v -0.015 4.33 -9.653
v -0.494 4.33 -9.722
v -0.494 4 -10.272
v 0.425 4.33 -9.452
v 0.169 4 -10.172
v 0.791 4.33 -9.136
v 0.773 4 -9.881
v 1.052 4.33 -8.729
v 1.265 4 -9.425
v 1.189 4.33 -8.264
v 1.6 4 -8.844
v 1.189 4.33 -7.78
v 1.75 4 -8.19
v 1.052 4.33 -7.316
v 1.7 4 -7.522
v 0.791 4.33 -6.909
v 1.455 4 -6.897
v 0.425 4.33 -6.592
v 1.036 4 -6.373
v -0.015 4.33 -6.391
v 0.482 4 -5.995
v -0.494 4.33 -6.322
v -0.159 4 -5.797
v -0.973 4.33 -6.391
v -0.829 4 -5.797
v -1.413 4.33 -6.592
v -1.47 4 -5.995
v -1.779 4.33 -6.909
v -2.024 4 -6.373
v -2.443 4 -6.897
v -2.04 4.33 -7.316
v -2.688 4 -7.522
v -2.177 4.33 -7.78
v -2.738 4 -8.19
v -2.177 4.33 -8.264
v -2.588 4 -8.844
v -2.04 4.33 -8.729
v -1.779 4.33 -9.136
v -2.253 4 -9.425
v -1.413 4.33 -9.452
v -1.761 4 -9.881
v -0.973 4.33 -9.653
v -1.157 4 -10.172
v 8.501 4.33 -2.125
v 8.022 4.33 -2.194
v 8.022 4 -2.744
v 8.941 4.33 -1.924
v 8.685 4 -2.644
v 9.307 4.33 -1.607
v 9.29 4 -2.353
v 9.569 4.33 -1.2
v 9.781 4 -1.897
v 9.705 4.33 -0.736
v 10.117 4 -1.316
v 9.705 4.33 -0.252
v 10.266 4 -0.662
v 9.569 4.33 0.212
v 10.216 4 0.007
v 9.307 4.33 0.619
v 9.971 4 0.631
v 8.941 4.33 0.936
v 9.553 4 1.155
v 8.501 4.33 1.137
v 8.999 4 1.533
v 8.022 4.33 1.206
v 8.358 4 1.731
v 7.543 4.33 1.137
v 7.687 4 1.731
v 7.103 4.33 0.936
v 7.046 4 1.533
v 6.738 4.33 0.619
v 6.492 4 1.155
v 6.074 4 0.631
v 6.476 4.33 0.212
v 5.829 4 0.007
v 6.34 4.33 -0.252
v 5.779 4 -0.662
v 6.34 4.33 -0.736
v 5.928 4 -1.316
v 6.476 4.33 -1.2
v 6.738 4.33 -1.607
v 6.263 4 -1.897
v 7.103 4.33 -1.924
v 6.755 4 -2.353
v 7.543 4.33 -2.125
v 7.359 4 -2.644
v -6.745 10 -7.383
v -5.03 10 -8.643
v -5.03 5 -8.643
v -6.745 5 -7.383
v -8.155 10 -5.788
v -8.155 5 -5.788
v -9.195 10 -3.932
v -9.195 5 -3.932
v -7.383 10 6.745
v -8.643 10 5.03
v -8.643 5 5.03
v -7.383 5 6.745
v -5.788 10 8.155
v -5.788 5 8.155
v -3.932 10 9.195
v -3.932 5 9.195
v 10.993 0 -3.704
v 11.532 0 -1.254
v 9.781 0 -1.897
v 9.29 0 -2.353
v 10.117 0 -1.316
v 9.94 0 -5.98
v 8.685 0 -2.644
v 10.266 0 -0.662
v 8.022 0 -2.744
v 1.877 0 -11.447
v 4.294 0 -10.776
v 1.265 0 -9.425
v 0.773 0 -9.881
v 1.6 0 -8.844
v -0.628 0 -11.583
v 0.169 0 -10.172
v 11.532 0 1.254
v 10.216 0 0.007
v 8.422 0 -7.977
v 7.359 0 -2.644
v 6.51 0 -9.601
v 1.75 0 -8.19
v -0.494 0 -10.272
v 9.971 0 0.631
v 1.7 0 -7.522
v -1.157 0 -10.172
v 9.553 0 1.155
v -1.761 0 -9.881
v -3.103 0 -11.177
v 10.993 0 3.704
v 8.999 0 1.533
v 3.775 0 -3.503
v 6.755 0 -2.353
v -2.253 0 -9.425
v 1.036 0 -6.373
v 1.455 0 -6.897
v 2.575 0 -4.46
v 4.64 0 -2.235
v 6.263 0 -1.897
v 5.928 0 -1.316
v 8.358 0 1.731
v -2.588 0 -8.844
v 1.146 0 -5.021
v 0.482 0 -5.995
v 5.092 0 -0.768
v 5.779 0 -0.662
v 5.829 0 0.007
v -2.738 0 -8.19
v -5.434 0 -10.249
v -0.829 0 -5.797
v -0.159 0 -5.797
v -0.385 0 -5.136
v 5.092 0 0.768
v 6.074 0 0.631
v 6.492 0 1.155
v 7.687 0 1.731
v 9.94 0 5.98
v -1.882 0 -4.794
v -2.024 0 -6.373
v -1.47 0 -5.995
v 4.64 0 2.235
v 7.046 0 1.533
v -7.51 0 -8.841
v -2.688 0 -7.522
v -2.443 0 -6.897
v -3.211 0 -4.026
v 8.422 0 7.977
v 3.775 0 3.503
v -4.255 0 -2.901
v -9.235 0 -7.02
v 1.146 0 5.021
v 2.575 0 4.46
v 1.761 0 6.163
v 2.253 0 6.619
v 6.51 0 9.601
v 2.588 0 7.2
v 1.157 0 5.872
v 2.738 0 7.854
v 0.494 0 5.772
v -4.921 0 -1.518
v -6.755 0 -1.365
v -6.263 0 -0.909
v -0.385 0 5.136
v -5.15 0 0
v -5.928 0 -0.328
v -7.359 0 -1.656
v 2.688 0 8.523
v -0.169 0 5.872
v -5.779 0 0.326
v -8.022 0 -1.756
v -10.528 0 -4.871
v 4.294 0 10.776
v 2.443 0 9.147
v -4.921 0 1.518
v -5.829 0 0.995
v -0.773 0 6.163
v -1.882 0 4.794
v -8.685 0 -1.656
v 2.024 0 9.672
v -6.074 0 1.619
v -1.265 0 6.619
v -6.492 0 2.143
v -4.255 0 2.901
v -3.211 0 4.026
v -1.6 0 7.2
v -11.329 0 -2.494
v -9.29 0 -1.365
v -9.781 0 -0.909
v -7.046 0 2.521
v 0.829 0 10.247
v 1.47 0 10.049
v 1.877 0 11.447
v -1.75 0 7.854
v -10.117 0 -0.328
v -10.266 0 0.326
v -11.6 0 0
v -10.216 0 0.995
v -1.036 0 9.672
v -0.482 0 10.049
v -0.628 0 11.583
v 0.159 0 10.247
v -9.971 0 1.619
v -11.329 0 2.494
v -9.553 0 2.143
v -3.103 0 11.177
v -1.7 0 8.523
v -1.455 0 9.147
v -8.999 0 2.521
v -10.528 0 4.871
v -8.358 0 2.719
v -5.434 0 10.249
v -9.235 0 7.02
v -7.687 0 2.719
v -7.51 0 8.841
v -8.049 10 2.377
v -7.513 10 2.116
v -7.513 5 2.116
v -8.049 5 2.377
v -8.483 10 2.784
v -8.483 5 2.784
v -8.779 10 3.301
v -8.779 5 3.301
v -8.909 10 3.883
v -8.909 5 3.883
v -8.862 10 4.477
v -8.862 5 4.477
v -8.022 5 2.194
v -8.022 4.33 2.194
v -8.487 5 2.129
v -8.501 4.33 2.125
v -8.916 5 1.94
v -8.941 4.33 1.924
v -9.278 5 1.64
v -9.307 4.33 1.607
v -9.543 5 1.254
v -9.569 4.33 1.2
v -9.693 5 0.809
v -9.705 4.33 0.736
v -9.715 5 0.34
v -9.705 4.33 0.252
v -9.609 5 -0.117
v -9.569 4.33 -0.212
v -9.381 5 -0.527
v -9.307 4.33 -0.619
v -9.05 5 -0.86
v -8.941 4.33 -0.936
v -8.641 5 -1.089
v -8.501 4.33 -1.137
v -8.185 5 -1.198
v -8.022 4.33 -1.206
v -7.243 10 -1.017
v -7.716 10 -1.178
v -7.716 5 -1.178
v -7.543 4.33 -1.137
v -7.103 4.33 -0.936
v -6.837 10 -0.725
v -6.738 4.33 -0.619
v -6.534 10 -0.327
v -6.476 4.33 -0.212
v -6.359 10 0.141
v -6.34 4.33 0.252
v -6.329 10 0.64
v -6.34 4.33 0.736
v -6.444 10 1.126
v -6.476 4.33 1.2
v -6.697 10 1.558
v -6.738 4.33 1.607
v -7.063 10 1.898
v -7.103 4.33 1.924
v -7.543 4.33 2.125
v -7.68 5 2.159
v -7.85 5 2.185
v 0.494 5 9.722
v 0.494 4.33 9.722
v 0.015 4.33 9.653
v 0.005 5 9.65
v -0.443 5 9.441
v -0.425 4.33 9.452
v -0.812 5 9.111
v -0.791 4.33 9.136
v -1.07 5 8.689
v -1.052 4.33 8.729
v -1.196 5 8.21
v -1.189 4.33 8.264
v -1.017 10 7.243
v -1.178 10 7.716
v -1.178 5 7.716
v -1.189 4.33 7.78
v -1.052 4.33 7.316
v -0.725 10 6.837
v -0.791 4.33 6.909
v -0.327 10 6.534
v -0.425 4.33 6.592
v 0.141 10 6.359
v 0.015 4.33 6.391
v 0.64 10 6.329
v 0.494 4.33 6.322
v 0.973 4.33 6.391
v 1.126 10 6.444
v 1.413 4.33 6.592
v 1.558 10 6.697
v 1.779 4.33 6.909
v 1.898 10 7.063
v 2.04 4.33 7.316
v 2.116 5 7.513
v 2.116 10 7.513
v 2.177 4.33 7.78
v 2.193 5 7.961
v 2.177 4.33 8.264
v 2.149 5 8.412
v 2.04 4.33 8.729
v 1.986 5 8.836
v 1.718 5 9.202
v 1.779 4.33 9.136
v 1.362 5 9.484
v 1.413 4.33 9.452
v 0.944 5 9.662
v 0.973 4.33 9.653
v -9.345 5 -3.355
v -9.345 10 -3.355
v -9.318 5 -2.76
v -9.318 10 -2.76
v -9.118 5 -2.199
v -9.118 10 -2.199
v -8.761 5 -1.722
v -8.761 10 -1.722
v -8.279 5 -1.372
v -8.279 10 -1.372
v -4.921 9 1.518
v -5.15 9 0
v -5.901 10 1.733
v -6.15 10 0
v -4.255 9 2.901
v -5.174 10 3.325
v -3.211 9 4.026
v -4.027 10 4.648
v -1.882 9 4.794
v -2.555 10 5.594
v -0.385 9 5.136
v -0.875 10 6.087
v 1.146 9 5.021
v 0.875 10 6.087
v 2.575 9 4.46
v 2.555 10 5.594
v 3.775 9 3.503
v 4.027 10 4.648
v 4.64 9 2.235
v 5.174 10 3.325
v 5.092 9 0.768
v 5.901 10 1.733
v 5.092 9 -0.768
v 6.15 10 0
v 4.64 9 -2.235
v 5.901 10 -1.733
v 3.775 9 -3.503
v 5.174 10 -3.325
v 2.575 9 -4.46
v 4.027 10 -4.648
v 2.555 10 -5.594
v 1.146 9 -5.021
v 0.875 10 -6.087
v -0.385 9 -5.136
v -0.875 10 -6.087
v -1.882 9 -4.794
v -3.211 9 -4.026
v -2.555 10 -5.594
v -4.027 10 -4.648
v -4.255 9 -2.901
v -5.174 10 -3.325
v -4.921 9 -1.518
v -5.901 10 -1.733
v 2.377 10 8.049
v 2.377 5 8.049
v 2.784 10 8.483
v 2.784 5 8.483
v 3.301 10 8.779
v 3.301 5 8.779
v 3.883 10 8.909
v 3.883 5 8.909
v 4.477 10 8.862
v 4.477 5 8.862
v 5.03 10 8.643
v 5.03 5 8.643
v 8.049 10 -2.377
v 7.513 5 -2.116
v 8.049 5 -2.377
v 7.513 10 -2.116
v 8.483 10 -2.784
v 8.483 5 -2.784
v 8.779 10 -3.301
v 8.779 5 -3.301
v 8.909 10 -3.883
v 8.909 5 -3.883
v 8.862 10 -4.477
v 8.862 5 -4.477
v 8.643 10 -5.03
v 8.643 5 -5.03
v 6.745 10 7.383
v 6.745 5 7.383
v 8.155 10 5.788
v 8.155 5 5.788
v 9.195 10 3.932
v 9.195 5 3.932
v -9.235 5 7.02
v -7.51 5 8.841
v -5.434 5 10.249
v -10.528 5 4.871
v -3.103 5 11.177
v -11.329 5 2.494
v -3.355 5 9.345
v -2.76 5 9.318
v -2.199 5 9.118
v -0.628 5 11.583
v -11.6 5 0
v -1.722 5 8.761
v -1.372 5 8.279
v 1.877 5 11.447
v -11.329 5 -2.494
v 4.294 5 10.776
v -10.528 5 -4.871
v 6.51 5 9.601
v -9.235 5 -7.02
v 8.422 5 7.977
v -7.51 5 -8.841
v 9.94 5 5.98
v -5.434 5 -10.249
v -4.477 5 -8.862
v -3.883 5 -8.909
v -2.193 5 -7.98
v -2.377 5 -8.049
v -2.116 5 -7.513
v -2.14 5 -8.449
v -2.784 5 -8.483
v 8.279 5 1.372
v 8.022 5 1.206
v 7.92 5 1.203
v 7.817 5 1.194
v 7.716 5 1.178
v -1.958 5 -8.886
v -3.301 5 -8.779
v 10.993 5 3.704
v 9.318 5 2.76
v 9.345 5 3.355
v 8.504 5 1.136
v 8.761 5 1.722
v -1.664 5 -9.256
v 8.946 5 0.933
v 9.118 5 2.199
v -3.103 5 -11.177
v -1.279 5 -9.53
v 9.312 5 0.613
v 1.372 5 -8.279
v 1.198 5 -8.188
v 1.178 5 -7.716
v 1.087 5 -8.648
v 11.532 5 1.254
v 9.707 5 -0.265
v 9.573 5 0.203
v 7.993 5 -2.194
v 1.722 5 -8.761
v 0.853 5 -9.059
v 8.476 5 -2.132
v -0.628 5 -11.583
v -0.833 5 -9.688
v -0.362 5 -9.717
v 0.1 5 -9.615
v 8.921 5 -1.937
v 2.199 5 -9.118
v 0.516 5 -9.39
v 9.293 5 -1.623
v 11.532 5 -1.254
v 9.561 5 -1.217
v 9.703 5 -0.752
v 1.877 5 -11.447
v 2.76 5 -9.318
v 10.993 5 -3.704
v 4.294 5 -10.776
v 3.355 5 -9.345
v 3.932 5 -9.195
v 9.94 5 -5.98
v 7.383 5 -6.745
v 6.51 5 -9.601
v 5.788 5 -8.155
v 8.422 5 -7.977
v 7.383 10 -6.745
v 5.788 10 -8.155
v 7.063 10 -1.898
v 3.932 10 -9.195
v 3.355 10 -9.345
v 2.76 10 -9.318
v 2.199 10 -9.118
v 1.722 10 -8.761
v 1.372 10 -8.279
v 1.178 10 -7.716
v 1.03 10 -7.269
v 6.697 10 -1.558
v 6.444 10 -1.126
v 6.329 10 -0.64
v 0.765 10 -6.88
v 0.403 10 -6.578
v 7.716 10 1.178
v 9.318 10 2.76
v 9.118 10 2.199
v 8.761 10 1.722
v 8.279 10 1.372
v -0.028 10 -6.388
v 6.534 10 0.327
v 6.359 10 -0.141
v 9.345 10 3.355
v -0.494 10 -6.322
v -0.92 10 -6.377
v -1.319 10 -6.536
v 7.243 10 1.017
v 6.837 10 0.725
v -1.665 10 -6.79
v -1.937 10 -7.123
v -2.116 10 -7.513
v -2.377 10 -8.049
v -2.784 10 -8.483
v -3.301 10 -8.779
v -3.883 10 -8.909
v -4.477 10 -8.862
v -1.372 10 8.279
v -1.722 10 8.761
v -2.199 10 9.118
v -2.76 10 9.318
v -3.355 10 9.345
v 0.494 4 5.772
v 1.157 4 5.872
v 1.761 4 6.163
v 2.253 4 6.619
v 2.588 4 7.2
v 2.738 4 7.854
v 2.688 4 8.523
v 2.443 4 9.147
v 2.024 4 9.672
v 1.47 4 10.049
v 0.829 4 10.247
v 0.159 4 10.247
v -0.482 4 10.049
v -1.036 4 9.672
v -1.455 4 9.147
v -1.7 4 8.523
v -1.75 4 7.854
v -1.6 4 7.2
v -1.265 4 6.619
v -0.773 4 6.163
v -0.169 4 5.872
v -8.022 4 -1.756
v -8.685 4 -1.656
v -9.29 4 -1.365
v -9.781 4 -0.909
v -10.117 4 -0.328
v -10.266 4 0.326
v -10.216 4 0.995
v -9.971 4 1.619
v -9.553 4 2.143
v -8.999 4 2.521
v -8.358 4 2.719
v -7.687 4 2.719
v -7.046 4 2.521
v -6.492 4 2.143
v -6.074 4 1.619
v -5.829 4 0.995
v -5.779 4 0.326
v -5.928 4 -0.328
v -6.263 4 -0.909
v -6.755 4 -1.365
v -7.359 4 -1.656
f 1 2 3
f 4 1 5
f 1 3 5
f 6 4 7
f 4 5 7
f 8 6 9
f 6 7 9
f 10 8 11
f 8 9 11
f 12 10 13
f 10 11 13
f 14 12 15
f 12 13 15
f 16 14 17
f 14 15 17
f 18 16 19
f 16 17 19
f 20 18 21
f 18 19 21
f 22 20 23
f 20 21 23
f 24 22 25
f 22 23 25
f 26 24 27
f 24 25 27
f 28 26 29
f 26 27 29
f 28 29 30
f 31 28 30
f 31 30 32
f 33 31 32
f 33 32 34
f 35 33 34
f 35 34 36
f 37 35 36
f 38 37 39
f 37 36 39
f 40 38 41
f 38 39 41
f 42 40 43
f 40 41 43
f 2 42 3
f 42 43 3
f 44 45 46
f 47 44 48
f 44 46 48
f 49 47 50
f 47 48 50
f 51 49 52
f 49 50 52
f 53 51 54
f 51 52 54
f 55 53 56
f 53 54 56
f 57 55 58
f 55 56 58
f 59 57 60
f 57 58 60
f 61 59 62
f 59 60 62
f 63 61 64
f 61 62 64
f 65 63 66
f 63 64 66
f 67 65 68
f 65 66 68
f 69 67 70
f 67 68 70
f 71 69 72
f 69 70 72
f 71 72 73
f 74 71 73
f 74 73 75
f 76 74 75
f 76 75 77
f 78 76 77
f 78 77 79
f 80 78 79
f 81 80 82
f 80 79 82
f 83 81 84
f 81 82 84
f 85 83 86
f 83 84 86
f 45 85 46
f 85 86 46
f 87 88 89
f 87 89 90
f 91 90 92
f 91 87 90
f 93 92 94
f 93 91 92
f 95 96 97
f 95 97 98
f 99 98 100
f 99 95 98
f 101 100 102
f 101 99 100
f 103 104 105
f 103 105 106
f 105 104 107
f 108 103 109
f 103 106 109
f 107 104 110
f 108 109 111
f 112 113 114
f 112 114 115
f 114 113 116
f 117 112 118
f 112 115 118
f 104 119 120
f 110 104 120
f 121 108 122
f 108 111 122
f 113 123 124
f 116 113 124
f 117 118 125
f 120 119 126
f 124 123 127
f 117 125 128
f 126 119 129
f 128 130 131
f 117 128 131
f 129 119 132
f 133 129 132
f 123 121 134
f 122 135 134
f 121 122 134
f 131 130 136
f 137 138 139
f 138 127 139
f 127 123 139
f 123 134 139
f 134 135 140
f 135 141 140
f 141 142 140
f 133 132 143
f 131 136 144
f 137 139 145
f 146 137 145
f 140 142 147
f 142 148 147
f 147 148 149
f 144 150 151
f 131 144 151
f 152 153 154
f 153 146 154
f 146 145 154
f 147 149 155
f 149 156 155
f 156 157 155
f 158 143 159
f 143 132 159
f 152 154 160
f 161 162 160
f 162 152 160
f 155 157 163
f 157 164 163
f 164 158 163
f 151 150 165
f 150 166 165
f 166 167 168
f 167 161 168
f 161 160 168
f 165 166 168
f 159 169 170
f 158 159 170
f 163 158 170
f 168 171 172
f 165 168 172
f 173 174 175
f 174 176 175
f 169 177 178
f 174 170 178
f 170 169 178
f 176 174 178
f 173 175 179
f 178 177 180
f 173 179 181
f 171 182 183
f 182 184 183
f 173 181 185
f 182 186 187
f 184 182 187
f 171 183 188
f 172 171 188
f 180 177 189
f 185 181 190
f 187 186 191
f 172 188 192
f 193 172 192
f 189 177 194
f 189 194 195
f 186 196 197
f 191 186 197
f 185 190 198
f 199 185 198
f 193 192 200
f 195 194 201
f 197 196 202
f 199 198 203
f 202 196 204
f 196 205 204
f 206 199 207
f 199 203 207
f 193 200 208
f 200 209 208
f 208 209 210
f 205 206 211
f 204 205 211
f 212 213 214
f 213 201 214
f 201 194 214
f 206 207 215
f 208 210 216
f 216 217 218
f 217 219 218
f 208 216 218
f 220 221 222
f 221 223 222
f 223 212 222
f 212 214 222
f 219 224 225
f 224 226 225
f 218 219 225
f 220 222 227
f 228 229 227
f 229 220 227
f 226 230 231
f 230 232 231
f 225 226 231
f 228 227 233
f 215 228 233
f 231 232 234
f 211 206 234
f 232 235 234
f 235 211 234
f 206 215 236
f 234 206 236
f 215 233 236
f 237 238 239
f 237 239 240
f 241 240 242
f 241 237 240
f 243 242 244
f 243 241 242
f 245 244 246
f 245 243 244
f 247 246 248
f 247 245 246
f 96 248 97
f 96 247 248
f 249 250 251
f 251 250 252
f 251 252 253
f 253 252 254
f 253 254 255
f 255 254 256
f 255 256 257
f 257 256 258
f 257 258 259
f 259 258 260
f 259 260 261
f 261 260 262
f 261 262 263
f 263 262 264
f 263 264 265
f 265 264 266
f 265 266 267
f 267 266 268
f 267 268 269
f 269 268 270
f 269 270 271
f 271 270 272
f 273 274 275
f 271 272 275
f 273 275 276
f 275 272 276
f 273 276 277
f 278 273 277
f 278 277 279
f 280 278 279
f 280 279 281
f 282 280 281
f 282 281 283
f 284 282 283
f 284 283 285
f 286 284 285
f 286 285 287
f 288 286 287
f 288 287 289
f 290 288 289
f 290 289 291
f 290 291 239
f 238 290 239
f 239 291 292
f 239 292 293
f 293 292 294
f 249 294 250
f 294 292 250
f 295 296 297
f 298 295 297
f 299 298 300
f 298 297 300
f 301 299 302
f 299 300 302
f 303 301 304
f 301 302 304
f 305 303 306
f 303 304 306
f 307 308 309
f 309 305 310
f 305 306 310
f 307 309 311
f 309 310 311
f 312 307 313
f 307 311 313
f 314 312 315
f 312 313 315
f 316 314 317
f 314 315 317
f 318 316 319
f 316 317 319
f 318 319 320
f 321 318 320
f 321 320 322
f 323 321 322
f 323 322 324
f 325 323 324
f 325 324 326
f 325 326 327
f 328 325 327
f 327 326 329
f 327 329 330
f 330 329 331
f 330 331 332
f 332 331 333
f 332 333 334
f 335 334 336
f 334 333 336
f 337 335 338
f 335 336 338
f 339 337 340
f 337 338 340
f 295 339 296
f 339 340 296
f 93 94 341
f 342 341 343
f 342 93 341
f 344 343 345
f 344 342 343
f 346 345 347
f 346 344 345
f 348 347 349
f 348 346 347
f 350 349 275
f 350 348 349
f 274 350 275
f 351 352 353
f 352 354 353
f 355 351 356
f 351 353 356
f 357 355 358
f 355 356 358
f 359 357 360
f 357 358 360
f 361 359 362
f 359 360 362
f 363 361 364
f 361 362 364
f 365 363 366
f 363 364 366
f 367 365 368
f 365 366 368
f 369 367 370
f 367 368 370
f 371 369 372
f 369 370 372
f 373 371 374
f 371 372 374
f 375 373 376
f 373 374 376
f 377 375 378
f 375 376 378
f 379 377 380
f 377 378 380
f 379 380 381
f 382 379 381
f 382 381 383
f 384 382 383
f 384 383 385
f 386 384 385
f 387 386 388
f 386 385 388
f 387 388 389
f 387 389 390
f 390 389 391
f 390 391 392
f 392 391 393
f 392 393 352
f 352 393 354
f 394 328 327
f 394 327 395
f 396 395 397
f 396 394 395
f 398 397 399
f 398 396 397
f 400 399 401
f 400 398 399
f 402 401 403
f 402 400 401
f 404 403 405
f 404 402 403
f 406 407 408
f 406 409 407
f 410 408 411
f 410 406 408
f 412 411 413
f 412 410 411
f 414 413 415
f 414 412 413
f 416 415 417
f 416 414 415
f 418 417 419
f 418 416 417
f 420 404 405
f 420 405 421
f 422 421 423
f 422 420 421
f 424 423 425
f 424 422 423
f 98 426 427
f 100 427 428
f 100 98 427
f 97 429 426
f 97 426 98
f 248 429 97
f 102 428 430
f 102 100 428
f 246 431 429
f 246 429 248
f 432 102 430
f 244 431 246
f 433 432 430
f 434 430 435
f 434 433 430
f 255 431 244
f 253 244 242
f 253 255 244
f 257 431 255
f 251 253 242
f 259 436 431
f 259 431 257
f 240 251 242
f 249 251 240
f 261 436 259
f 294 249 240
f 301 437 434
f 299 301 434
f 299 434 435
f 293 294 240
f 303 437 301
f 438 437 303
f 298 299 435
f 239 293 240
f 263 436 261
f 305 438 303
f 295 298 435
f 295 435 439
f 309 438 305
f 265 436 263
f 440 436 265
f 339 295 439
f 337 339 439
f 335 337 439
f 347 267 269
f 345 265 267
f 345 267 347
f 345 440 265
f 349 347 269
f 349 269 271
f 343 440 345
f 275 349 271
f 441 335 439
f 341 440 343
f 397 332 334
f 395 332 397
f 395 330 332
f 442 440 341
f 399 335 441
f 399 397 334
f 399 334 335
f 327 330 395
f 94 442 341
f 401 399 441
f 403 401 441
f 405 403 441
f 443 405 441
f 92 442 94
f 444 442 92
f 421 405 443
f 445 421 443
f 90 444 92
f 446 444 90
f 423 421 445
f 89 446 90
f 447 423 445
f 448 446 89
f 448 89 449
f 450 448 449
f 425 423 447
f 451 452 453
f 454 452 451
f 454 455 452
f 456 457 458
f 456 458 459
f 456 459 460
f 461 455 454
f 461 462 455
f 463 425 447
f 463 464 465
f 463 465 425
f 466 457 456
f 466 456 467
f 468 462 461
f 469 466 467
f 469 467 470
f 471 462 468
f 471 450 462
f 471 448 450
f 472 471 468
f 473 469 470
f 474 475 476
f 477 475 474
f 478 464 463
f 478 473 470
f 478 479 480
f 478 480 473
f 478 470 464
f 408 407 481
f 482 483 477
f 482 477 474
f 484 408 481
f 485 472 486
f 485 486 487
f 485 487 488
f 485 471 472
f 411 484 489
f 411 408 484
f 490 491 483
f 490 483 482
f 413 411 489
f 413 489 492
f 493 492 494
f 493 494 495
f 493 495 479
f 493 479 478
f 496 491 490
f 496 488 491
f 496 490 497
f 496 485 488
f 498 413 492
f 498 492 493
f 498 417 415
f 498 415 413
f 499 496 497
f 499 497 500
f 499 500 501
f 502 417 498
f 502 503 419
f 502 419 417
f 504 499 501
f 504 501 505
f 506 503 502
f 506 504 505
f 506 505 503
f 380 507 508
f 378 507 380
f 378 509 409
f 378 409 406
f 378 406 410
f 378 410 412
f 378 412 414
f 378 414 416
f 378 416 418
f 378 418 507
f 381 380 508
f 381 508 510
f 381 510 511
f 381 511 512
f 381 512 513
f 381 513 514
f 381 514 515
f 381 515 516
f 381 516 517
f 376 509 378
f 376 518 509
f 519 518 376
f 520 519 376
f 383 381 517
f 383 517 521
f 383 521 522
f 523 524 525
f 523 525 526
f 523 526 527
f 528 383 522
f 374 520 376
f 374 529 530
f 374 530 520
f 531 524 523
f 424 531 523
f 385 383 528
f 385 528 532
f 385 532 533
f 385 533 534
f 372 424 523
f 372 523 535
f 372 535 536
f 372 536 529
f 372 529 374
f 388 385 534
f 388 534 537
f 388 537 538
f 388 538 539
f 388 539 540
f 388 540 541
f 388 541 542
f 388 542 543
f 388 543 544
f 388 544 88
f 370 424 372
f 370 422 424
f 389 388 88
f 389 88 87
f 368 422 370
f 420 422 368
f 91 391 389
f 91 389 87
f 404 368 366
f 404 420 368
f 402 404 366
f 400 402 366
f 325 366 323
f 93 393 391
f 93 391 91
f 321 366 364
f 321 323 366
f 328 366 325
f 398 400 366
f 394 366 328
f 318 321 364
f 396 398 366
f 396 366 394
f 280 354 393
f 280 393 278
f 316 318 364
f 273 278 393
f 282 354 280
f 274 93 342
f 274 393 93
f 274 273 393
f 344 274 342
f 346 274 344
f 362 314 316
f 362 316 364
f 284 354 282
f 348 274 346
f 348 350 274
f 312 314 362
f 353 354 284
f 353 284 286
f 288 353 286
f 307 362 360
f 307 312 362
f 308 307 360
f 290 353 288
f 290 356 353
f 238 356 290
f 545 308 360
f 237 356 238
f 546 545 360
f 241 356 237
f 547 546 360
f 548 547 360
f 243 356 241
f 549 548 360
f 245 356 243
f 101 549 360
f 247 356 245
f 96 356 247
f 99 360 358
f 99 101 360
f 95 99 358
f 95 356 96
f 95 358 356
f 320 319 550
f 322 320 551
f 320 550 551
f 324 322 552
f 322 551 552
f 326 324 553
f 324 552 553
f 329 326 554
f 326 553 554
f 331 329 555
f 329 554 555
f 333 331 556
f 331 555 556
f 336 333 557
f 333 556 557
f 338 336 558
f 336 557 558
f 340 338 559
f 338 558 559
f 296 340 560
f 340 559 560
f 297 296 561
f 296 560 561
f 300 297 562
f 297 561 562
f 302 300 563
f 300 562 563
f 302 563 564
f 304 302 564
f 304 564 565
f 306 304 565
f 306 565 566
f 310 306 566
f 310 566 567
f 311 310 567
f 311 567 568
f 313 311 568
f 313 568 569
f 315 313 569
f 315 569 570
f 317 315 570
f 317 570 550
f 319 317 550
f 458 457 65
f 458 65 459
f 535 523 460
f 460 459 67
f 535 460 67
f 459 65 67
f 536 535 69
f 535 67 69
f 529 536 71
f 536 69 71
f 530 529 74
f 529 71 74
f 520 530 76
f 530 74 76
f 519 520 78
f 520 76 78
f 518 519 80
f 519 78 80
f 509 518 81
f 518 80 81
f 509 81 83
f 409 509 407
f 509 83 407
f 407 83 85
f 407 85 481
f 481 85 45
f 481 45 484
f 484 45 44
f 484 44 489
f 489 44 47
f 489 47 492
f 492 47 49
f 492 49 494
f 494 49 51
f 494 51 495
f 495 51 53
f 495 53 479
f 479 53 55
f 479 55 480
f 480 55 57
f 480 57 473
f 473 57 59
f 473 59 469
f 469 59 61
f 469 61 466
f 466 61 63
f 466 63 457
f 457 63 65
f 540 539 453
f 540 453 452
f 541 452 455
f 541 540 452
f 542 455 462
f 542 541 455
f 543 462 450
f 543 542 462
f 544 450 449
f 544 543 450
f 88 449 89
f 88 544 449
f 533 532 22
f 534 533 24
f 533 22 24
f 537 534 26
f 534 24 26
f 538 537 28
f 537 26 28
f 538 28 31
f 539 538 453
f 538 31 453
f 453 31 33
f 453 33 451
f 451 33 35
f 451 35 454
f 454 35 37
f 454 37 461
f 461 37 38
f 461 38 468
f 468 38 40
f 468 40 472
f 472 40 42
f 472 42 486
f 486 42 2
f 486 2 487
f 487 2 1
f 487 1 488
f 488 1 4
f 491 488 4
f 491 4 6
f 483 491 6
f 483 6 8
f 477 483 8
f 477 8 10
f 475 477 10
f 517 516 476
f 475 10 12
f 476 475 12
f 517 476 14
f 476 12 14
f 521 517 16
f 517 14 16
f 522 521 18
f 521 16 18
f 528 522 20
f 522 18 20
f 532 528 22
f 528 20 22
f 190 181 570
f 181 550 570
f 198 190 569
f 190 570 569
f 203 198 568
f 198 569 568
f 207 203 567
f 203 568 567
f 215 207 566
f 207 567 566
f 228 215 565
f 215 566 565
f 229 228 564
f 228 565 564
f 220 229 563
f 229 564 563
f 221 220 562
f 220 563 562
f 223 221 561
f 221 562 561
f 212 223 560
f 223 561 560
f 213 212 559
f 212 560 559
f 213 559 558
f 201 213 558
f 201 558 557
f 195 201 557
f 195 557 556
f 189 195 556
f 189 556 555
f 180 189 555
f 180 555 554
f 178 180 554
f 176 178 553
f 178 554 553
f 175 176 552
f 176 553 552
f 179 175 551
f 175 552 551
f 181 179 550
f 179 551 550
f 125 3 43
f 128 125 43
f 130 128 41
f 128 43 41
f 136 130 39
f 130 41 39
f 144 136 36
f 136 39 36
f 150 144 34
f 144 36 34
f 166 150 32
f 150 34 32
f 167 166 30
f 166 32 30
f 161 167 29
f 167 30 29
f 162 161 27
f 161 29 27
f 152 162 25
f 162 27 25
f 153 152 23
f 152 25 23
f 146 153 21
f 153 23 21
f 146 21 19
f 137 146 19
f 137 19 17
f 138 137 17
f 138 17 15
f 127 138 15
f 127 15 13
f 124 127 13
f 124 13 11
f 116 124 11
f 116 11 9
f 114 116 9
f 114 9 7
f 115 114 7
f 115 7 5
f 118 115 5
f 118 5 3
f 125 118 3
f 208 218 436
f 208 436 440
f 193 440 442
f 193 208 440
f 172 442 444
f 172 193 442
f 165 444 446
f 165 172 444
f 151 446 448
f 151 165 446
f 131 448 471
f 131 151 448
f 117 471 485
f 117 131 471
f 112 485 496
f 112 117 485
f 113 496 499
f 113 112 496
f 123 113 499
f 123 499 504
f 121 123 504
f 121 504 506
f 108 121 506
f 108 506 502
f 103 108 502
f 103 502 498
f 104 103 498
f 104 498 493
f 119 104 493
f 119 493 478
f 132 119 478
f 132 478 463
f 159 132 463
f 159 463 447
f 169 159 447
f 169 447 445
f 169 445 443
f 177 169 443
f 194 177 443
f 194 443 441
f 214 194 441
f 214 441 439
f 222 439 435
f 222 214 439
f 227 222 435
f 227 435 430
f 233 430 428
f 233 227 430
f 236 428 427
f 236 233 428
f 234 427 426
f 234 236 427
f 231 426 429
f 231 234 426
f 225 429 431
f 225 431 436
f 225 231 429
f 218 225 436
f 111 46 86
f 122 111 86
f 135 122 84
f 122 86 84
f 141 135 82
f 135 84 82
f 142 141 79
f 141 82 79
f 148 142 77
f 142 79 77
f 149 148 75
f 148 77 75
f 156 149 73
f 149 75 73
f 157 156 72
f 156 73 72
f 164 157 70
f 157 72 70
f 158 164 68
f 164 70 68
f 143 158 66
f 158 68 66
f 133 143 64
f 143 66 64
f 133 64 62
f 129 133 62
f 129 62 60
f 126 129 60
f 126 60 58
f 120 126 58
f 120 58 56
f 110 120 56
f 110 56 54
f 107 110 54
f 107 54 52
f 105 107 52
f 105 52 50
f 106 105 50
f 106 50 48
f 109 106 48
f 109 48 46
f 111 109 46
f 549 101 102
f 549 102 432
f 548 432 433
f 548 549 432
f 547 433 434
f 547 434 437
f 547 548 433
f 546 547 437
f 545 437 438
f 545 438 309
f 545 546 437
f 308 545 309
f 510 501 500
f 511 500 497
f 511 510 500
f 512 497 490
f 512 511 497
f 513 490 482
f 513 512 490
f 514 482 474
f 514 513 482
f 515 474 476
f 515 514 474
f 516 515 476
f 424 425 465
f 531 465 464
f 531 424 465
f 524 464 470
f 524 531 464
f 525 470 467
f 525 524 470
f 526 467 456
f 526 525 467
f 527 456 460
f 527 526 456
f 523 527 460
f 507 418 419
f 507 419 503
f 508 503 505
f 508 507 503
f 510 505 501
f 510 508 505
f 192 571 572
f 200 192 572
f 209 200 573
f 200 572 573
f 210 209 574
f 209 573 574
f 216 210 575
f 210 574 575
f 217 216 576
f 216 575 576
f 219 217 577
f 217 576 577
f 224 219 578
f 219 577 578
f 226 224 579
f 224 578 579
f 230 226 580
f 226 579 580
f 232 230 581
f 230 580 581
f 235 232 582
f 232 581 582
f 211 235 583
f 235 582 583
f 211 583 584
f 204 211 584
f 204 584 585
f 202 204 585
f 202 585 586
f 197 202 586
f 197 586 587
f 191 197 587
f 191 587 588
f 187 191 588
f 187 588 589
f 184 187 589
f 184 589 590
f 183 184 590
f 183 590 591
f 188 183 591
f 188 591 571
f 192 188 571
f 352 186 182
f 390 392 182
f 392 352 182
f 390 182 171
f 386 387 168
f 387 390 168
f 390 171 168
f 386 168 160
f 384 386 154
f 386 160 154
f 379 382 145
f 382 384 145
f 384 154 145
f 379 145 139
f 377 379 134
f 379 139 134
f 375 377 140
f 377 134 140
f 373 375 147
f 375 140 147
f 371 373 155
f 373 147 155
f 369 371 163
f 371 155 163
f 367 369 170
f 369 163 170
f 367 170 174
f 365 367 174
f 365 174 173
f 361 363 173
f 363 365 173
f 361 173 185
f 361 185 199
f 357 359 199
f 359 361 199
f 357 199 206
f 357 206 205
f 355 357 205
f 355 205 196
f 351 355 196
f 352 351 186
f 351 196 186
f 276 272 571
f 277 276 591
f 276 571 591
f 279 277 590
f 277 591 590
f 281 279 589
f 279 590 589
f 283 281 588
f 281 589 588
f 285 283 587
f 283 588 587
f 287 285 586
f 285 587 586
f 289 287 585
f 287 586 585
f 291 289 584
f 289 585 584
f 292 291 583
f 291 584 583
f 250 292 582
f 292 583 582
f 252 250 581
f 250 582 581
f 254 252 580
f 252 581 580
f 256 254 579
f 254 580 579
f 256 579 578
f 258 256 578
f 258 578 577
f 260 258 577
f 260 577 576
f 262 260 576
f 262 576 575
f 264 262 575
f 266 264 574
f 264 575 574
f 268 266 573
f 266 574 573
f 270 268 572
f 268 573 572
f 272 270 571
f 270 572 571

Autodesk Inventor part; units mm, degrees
ref_plane "YZ Plane" through (0, 0, 0) normal (1, 0, 0) x (0, 1, 0)
ref_plane "XZ Plane" through (0, 0, 0) normal (0, 1, 0) x (-1, 0, 0)
ref_plane "XY Plane" through (0, 0, 0) normal (0, 0, 1) x (1, 0, 0)
sketch "Boceto1" plane through (0, 0, 0) normal (0, 1, 0) x (-1, 0, 0)
  circle A0 centre (0, 0) radius 5.15
  circle A1 centre (0, 0) radius 11.6
  dimension "d0" = 10.3
  dimension "d1" = 23.2
extrude "Extrusión1" add sketch "Boceto1" along normal blind 10
sketch "Boceto2" plane through (0, 10, 0) normal (0, 1, 0) x (1, 0, 0)
  circle A0 centre (-0.494, 8.0223) radius 1.425 projected
  circle A1 centre (-0.494, 8.0223) radius 1.425 projected
  circle A2 centre (-8.0223, -0.494) radius 1.425 projected
  circle A3 centre (0.494, -8.0223) radius 1.425 projected
  circle A4 centre (8.0223, 0.494) radius 1.425 projected
  circle A5 centre (0, 0) radius 11 projected
  circle A6 centre (0, 0) radius 1.5 projected
  point P0 (0, 0)
hole "Agujero1" at (-0.494, 10, -8.0223) at (8.0223, 10, -0.494) at (0.494, 10, 8.0223) at (-8.0223, 10, 0.494) direction (0, -1, 0) diameter 3.4 end through all
sketch "Boceto3" plane through (0, 0, 0) normal (0, -1, 0) x (1, 0, 0)
  circle A0 centre (-8.0223, 0.494) radius 1.7 projected
  circle A1 centre (0.494, 8.0223) radius 1.7 projected
  circle A2 centre (8.0223, -0.494) radius 1.7 projected
  circle A3 centre (-0.494, -8.0223) radius 1.7 projected
  circle A4 centre (0, 0) radius 11.6 projected
  circle A5 centre (0, 0) radius 5.15 projected
hole "Agujero2" at (-0.494, 0, -8.0223) at (-8.0223, 0, 0.494) at (0.494, 0, 8.0223) at (8.0223, 0, -0.494) direction (0, 1, 0) diameter 4.5 depth 4 tip angle 118
sketch "Boceto4" plane through (0, 10, 0) normal (0, 1, 0) x (1, 0, 0)
  circle A0 centre (-0.494, 8.0223) radius 1.425 projected
  circle A1 centre (-8.0223, -0.494) radius 1.425 projected
  circle A2 centre (0.494, -8.0223) radius 1.425 projected
  circle A3 centre (8.0223, 0.494) radius 1.425 projected
  circle A4 centre (0, 0) radius 11 projected
  circle A5 centre (0, 0) radius 5 projected
  line L0 (-9.7564, -2.194) -> (-8.0223, -2.194)
  circle A6 centre (-8.0223, -0.494) radius 1.7 projected
  line L1 (-8.0223, 1.206) -> (-9.927, 1.206)
  line L2 (-1.206, -8.0223) -> (-1.206, -9.927)
  line L3 (2.194, -9.7564) -> (2.194, -8.0223)
  line L4 (8.0223, -1.206) -> (9.927, -1.206)
  line L5 (9.7564, 2.194) -> (8.0223, 2.194)
  line L6 (1.206, 8.0223) -> (1.206, 9.927)
  line L7 (-2.194, 9.7564) -> (-2.194, 8.0223)
  arc A7 (-2.194, 9.7564) -> (-9.927, 1.206) centre (0, 0) ccw
  arc A8 (9.7564, 2.194) -> (1.206, 9.927) centre (0, 0) ccw
  arc A9 (-9.7564, -2.194) -> (-1.206, -9.927) centre (0, 0) ccw
  arc A10 (2.194, -9.7564) -> (9.927, -1.206) centre (0, 0) ccw
  circle A11 centre (-0.494, 8.0223) radius 1.425 projected
  circle A12 centre (-8.0223, -0.494) radius 1.425 projected
  circle A13 centre (0.494, -8.0223) radius 1.425 projected
  circle A14 centre (8.0223, 0.494) radius 1.425 projected
  circle A15 centre (0, 0) radius 11 projected
  circle A16 centre (0, 0) radius 1.5 projected
  circle A17 centre (-0.494, 8.0223) radius 1.425 projected
  circle A18 centre (-8.0223, -0.494) radius 1.425 projected
  circle A19 centre (0.494, -8.0223) radius 1.425 projected
  circle A20 centre (8.0223, 0.494) radius 1.425 projected
  circle A21 centre (0, 0) radius 11 projected
  circle A22 centre (0, 0) radius 5 projected
  circle A23 centre (-0.494, 8.0223) radius 1.425 projected
  circle A24 centre (-8.0223, -0.494) radius 1.425 projected
  circle A25 centre (0.494, -8.0223) radius 1.425 projected
  circle A26 centre (8.0223, 0.494) radius 1.425 projected
  circle A27 centre (0, 0) radius 11 projected
  circle A28 centre (0, 0) radius 5 projected
  circle A29 centre (0.494, -8.0223) radius 1.7 projected
  circle A30 centre (8.0223, 0.494) radius 1.7 projected
  circle A31 centre (-0.494, 8.0223) radius 1.7 projected
  circle A32 centre (0, 0) radius 11.6 projected
  dimension "d21" = 360
extrude "Extrusión2" cut sketch "Boceto4" against normal blind 5 contours A4 | A32
fillet "Empalme1" radius 2 8 edges at (-9.7564, 7.5, 2.194) (-9.927, 7.5, -1.206) (-2.194, 7.5, -9.7564) (1.206, 7.5, -9.927) (-1.206, 7.5, 9.927) (2.194, 7.5, 9.7564) (9.927, 7.5, 1.206) (9.7564, 7.5, -2.194)
chamfer "Chaflán1" distance 1 angle 45 1 edges at (5.15, 10, 0)
properties part number "Polea"
